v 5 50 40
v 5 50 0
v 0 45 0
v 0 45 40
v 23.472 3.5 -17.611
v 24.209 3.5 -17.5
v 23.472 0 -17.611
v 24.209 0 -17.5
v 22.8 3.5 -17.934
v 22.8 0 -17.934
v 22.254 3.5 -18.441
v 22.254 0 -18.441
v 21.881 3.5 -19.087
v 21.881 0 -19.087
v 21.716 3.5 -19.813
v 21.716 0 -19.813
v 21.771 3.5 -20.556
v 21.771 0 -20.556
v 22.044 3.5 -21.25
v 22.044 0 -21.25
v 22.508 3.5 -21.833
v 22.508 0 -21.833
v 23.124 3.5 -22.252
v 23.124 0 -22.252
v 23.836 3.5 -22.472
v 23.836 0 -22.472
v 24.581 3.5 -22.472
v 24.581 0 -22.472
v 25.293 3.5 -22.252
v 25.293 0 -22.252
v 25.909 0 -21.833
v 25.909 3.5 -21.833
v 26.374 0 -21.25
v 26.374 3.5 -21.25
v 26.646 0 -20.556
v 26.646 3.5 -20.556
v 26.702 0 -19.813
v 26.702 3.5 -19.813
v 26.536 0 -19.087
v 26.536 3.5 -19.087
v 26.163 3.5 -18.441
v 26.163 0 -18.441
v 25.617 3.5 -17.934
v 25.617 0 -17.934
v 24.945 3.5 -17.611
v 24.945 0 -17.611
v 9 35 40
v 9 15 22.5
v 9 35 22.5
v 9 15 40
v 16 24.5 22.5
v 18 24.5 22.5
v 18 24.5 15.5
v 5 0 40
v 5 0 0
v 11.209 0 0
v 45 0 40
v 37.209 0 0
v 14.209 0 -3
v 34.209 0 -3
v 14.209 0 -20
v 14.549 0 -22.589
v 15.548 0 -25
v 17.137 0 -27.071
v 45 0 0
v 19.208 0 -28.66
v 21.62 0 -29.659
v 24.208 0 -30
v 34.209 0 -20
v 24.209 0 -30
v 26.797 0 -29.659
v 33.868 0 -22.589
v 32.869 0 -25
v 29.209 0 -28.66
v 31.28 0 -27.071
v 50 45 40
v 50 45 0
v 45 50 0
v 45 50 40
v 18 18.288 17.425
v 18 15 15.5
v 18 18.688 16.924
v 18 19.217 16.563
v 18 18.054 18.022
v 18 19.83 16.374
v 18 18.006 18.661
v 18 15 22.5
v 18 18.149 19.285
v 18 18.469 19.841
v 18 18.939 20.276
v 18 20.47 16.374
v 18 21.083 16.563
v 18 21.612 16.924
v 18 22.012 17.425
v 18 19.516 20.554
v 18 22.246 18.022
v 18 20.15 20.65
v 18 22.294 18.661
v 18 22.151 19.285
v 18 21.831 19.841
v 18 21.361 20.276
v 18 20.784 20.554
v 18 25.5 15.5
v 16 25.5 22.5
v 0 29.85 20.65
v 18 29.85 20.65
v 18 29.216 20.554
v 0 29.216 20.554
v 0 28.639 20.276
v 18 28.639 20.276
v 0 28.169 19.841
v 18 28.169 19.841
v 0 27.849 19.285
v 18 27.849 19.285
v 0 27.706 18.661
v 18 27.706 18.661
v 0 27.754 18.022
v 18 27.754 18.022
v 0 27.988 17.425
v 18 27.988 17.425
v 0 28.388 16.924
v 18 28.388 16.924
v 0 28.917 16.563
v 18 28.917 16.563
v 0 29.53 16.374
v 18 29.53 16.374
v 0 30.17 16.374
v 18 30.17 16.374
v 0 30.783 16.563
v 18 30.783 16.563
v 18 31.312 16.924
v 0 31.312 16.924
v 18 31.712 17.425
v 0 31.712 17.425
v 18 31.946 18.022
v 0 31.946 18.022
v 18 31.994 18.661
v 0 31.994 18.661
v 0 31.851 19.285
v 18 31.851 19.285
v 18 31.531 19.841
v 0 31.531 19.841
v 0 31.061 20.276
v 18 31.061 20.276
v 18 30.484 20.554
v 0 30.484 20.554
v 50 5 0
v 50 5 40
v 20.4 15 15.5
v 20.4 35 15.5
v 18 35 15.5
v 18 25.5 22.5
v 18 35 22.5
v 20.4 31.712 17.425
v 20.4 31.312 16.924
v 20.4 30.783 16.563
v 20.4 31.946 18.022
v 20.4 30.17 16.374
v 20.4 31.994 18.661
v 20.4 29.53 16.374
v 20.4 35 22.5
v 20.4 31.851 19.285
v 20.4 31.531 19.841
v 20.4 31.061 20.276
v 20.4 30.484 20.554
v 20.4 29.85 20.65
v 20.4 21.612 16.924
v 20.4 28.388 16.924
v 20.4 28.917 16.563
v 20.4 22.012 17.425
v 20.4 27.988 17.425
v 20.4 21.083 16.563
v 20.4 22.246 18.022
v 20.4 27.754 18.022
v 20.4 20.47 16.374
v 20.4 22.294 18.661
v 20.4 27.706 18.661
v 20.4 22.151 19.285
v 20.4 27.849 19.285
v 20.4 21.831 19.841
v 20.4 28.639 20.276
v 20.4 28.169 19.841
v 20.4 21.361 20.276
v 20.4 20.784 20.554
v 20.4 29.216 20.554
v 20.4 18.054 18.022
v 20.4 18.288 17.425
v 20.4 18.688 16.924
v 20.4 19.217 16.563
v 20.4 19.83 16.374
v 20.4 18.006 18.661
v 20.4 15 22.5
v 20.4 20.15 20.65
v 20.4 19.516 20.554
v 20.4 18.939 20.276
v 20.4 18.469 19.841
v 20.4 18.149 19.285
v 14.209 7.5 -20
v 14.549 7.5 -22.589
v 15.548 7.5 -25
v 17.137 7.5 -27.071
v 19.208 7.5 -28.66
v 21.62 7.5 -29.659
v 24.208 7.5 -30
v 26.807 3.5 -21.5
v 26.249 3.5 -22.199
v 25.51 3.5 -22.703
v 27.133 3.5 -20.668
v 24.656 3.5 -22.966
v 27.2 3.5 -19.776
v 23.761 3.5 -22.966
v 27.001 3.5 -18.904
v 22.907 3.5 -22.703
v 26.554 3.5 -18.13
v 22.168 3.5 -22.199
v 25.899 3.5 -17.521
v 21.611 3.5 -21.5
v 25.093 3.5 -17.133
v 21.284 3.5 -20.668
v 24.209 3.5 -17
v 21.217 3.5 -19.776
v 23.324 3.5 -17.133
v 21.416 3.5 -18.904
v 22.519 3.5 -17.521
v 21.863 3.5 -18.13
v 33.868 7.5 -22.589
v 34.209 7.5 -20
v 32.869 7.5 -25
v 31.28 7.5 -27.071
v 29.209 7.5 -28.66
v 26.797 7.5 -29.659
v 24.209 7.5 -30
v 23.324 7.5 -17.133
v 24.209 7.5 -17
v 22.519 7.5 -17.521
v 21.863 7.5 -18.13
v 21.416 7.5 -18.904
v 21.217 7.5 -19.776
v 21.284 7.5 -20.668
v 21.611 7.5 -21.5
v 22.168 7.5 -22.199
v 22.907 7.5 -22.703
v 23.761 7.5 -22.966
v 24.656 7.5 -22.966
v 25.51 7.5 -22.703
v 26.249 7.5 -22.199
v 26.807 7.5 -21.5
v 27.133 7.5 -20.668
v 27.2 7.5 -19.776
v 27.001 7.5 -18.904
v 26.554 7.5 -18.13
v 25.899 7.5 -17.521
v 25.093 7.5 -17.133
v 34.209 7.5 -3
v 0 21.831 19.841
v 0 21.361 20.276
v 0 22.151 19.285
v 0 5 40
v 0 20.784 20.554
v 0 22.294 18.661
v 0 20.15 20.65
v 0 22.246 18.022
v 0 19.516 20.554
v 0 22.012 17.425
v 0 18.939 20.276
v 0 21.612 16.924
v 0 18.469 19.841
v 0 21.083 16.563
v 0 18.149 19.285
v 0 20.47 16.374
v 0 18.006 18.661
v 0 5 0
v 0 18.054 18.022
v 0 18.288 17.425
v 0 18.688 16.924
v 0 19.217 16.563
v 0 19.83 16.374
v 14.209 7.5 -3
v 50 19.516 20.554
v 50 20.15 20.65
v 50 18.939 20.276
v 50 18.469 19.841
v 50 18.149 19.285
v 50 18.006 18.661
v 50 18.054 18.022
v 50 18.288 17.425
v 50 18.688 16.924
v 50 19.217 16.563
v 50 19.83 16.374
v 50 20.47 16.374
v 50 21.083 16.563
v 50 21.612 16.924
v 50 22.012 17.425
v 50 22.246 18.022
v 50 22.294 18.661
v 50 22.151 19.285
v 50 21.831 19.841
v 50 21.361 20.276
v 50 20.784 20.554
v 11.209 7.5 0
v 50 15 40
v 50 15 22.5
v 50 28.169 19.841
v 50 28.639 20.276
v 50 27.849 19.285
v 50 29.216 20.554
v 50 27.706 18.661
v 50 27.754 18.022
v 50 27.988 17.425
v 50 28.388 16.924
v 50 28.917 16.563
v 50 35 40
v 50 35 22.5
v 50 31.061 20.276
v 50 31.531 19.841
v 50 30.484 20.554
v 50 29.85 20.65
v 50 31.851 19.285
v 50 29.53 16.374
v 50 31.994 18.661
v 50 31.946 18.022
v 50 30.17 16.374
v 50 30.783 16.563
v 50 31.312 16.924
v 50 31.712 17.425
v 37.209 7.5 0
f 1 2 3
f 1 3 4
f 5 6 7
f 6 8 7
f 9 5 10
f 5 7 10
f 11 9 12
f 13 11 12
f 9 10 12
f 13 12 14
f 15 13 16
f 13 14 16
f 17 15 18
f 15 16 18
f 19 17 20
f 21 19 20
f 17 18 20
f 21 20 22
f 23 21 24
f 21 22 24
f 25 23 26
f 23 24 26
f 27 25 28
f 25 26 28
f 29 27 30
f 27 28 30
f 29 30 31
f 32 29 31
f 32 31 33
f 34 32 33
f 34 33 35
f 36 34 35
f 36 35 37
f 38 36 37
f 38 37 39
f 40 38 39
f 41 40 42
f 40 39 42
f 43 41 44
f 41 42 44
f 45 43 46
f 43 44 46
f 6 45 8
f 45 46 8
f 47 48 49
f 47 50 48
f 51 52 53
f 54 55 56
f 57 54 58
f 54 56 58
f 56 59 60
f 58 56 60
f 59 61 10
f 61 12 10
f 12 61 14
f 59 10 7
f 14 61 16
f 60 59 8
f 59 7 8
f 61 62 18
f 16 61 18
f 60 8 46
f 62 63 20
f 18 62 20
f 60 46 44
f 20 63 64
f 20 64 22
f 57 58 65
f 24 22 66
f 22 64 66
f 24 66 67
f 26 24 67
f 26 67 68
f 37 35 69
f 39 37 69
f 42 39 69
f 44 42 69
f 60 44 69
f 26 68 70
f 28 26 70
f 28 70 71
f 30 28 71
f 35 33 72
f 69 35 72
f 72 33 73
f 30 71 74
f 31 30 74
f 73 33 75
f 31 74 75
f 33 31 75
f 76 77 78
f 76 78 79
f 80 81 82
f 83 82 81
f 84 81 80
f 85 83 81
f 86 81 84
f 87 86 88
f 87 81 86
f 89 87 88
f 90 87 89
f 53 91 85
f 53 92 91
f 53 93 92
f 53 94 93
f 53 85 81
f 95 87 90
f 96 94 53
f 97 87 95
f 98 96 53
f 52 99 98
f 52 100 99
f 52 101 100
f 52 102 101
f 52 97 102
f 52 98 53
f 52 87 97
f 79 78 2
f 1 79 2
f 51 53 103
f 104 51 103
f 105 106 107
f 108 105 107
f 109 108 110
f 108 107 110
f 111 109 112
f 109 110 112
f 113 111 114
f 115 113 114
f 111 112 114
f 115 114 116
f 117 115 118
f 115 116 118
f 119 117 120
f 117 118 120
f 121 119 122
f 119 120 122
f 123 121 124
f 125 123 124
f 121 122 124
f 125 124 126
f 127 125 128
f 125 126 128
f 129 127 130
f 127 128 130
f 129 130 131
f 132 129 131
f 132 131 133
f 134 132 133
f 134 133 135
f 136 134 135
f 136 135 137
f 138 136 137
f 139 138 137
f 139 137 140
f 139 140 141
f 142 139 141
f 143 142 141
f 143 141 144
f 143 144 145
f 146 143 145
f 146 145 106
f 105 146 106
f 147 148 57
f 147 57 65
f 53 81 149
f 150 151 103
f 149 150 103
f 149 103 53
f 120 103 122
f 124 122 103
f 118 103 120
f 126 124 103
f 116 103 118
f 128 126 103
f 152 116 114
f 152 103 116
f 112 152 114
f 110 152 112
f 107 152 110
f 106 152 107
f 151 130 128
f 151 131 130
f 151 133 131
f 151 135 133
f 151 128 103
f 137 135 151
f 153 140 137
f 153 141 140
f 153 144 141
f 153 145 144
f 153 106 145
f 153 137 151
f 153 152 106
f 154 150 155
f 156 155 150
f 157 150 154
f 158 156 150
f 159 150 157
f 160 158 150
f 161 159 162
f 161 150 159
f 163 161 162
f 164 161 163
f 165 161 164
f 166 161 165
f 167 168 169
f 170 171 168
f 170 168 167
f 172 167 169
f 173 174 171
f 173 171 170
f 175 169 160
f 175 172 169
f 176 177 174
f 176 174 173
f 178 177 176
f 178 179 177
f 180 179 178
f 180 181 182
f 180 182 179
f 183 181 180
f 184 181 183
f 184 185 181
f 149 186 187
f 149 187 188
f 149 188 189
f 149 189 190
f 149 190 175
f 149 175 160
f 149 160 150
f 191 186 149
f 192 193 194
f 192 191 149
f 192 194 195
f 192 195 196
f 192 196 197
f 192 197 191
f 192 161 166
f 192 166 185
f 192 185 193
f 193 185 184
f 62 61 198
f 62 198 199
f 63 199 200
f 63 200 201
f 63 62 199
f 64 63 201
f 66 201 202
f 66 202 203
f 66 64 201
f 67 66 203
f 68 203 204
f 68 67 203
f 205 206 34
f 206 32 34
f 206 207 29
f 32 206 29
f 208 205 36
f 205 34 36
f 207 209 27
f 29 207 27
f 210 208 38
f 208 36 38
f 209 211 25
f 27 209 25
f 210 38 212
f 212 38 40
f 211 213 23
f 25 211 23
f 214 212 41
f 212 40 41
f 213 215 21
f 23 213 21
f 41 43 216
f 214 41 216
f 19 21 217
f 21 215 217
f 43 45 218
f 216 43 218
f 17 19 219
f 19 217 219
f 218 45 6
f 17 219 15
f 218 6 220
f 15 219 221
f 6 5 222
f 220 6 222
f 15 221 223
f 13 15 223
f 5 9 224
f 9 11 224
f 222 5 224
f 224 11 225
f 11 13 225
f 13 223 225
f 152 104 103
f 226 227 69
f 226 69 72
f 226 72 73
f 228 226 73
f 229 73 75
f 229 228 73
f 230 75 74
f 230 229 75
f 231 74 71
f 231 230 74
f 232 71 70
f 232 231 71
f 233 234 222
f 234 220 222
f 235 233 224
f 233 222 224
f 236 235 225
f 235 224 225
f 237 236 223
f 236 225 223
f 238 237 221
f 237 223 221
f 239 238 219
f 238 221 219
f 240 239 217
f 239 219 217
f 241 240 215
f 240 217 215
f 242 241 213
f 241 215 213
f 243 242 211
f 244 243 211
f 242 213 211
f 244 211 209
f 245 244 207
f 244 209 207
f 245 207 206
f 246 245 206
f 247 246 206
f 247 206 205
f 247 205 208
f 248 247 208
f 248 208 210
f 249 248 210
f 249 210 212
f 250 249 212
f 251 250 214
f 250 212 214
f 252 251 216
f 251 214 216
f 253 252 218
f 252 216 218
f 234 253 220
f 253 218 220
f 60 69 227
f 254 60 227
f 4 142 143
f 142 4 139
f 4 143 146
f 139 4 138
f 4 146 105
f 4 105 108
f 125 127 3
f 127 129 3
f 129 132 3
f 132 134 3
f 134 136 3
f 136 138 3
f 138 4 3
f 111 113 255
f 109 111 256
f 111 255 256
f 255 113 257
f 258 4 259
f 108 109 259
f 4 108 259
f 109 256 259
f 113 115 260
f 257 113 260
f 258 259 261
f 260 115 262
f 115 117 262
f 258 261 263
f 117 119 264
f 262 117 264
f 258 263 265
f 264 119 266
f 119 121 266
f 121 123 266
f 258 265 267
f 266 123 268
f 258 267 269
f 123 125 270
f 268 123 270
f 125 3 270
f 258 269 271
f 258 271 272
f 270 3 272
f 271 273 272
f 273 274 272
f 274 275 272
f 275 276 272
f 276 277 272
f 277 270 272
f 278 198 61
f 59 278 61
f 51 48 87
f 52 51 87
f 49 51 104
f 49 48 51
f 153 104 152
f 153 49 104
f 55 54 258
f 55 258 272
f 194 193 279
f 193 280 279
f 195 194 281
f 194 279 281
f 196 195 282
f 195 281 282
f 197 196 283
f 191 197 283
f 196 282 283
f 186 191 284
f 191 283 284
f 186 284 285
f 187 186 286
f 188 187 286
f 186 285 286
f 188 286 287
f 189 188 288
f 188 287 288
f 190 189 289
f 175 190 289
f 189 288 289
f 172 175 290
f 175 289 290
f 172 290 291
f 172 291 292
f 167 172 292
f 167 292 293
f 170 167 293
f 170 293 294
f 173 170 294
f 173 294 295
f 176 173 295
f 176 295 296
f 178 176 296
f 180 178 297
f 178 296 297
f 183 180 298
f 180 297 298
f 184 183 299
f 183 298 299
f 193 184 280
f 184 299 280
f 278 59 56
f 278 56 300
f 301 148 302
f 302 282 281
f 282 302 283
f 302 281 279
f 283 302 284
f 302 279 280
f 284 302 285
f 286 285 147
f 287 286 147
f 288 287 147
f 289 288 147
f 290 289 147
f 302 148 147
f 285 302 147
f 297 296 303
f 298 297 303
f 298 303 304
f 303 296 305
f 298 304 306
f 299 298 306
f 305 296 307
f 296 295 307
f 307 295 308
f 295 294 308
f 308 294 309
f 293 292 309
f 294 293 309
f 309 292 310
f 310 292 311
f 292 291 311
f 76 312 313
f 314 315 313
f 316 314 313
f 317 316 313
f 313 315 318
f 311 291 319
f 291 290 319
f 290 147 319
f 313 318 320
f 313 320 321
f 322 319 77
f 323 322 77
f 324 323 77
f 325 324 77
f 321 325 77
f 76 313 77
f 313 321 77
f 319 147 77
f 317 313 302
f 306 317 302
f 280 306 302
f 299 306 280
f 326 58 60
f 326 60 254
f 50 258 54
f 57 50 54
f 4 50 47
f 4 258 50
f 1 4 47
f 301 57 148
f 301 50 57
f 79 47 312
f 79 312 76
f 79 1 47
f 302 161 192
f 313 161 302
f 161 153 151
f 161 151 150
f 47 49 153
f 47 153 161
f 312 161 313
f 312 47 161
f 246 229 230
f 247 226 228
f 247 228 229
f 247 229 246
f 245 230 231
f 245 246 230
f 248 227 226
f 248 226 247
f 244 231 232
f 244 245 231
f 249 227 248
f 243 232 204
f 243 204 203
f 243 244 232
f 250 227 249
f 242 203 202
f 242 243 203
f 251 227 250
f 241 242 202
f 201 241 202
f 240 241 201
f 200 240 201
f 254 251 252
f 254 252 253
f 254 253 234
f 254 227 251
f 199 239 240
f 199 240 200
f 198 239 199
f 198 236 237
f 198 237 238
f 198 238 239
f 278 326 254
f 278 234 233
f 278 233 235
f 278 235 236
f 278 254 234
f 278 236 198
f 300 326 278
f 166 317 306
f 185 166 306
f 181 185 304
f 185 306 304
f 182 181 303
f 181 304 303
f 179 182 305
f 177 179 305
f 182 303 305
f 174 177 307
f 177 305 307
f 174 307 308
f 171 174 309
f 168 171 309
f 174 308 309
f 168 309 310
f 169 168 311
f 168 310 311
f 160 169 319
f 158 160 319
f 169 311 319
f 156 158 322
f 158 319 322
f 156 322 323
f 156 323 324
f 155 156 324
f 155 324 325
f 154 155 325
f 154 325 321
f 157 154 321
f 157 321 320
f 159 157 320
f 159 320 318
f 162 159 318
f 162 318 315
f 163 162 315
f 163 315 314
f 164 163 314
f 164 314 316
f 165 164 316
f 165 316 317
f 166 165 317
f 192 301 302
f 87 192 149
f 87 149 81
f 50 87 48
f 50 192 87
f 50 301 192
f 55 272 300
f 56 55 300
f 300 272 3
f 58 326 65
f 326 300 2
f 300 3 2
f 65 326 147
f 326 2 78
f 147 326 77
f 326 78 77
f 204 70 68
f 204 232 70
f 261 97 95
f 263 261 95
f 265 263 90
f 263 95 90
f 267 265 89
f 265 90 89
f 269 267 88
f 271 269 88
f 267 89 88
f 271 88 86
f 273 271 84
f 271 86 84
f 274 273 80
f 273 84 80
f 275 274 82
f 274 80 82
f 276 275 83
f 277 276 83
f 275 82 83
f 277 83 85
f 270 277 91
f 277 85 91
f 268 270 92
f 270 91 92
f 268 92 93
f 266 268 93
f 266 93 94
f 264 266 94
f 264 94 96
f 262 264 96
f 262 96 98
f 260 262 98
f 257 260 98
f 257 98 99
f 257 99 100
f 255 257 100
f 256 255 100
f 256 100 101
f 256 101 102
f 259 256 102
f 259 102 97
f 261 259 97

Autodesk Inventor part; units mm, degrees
ref_plane "YZ Plane" through (0, 0, 0) normal (1, 0, 0) x (0, 1, 0)
ref_plane "XZ Plane" through (0, 0, 0) normal (0, 1, 0) x (-1, 0, 0)
ref_plane "XY Plane" through (0, 0, 0) normal (0, 0, 1) x (1, 0, 0)
sketch "Sketch1" plane through (0, 0, 0) normal (0, 0, 1) x (1, 0, 0)
  line L0 (0, 0) -> (50, 0)
  line L1 (50, 0) -> (50, 50)
  line L2 (50, 50) -> (0, 50)
  line L3 (0, 50) -> (0, 0)
  dimension "d0" = 50
  dimension "d1" = 50
extrude "Extrusion1" add sketch "Sketch1" along normal blind 40
sketch "Sketch2" plane through (0, 0, 40) normal (0, 0, 1) x (1, 0, 0)
  line L0 (50, 0) -> (50, 50) projected
  line L1 (50, 15) -> (9, 15)
  line L2 (9, 15) -> (9, 35)
  line L3 (9, 35) -> (50, 35)
  line L4 (50, 35) -> (50, 15)
  line L5 (0, 0) -> (50, 0) projected
  point P0 (50, 35)
  dimension "d4" = 41
  dimension "d5" = 20
  dimension "d6" = 15
extrude "Extrusion2" cut sketch "Sketch2" against normal blind 17.5
sketch "Sketch3" plane through (0, 0, 0) normal (-1, 0, 0) x (0, 0, 1)
  line L0 (40, 50) -> (40, 0) projected
  line L1 (40, 35) -> (18.5, 35) construction
  line L2 (40, 35) -> (61.5, 35) construction
  line L3 (18.5, 35) -> (18.5, 15) construction
  line L4 (18.5, 15) -> (40, 15) construction
  line L5 (0, 50) -> (40, 50) projected
  line L6 (40, 29.85) -> (18.5, 29.85) construction
  line L7 (40, 20.15) -> (18.5, 20.15) construction
  point P0 (0, 0)
  dimension "d9" = 21.5
  dimension "d10" = 180
  dimension "d11" = 20
  dimension "d12" = 15
  dimension "d13" = 5.15
  dimension "d14" = 5.15
hole "Hole1" at (0, 29.85, 18.5) at (0, 20.15, 18.5) direction (1, 0, 0) diameter 4.3 end through all
sketch "Sketch4" plane through (0, 0, 22.5) normal (0, 0, 1) x (1, 0, 0)
  line L0 (9, 35) -> (50, 35) projected
  line L1 (50, 15) -> (9, 15) projected
  line L2 (18, 35) -> (20.4, 35)
  line L3 (20.4, 35) -> (20.4, 15)
  line L4 (20.4, 15) -> (18, 15)
  line L5 (18, 15) -> (18, 35)
  line L6 (9, 15) -> (9, 35) projected
  point P0 (0, 0)
  point P1 (18, 15)
  dimension "d22" = 9
  dimension "d23" = 2.4
extrude "Extrusion3" cut sketch "Sketch4" against normal blind 7 contours L0 L3 L1 L5
chamfer "Chamfer1" distance 5 angle 45 4 edges at (0, 50, 20) (50, 50, 20) (0, 0, 20) (50, 0, 20)
sketch "Sketch7" plane through (0, 0, 22.5) normal (0, 0, 1) x (1, 0, 0)
  line L0 (18, 15) -> (18, 35) projected
  line L1 (18, 24.5) -> (16, 24.5)
  line L2 (16, 24.5) -> (16, 25.5)
  line L3 (16, 25.5) -> (18, 25.5)
  line L4 (18, 25.5) -> (18, 24.5)
  line L5 (9, 35) -> (50, 35) projected
  point P0 (0, 0)
  dimension "d45" = 2
  dimension "d46" = 1
  dimension "d47" = 9.5
extrude "Extrusion5" cut sketch "Sketch7" against normal blind 7
chamfer "Chamfer3" distance 7 distance2 2 1 edges at (16, 25, 15.5) measured on face at (16, 25.1667, 20.1667)
sketch "Sketch8" plane through (0, 0, 0) normal (0, 0, -1) x (-1, 0, 0)
  line L0 (-5, 0) -> (-45, 0) projected
  line L1 (-14.2086, 0) -> (-34.2086, 0)
  line L2 (-34.2086, 0) -> (-34.2086, 7.5)
  line L3 (-34.2086, 7.5) -> (-14.2086, 7.5)
  line L4 (-14.2086, 7.5) -> (-14.2086, 0)
  point P0 (0, 0)
  dimension "d53" = 20
  dimension "d54" = 7.5
extrude "Extrusion6" add sketch "Sketch8" along normal blind 30
fillet "Fillet2" radius 10 2 edges at (34.2086, 3.75, -30) (14.2086, 3.75, -30)
chamfer "Chamfer4" distance 3 angle 45 2 edges at (34.2086, 3.75, 0) (14.2086, 3.75, 0)
sketch "Sketch9" plane through (24.2086, 7.5, -20) normal (0, 1, 0) x (1, 0, 0)
  line L0 (13, -20) -> (-13, -20) projected
  line L1 (0, -20) -> (0, 0) construction
  point P0 (-24.2086, -20)
  dimension "d61" = 20
hole "Hole3" at (24.2086, 7.5, -20) direction (0, -1, 0) diameter 5 end through all counterbore diameter 6 counterbore depth 4
properties part number "ES117_MP1"
